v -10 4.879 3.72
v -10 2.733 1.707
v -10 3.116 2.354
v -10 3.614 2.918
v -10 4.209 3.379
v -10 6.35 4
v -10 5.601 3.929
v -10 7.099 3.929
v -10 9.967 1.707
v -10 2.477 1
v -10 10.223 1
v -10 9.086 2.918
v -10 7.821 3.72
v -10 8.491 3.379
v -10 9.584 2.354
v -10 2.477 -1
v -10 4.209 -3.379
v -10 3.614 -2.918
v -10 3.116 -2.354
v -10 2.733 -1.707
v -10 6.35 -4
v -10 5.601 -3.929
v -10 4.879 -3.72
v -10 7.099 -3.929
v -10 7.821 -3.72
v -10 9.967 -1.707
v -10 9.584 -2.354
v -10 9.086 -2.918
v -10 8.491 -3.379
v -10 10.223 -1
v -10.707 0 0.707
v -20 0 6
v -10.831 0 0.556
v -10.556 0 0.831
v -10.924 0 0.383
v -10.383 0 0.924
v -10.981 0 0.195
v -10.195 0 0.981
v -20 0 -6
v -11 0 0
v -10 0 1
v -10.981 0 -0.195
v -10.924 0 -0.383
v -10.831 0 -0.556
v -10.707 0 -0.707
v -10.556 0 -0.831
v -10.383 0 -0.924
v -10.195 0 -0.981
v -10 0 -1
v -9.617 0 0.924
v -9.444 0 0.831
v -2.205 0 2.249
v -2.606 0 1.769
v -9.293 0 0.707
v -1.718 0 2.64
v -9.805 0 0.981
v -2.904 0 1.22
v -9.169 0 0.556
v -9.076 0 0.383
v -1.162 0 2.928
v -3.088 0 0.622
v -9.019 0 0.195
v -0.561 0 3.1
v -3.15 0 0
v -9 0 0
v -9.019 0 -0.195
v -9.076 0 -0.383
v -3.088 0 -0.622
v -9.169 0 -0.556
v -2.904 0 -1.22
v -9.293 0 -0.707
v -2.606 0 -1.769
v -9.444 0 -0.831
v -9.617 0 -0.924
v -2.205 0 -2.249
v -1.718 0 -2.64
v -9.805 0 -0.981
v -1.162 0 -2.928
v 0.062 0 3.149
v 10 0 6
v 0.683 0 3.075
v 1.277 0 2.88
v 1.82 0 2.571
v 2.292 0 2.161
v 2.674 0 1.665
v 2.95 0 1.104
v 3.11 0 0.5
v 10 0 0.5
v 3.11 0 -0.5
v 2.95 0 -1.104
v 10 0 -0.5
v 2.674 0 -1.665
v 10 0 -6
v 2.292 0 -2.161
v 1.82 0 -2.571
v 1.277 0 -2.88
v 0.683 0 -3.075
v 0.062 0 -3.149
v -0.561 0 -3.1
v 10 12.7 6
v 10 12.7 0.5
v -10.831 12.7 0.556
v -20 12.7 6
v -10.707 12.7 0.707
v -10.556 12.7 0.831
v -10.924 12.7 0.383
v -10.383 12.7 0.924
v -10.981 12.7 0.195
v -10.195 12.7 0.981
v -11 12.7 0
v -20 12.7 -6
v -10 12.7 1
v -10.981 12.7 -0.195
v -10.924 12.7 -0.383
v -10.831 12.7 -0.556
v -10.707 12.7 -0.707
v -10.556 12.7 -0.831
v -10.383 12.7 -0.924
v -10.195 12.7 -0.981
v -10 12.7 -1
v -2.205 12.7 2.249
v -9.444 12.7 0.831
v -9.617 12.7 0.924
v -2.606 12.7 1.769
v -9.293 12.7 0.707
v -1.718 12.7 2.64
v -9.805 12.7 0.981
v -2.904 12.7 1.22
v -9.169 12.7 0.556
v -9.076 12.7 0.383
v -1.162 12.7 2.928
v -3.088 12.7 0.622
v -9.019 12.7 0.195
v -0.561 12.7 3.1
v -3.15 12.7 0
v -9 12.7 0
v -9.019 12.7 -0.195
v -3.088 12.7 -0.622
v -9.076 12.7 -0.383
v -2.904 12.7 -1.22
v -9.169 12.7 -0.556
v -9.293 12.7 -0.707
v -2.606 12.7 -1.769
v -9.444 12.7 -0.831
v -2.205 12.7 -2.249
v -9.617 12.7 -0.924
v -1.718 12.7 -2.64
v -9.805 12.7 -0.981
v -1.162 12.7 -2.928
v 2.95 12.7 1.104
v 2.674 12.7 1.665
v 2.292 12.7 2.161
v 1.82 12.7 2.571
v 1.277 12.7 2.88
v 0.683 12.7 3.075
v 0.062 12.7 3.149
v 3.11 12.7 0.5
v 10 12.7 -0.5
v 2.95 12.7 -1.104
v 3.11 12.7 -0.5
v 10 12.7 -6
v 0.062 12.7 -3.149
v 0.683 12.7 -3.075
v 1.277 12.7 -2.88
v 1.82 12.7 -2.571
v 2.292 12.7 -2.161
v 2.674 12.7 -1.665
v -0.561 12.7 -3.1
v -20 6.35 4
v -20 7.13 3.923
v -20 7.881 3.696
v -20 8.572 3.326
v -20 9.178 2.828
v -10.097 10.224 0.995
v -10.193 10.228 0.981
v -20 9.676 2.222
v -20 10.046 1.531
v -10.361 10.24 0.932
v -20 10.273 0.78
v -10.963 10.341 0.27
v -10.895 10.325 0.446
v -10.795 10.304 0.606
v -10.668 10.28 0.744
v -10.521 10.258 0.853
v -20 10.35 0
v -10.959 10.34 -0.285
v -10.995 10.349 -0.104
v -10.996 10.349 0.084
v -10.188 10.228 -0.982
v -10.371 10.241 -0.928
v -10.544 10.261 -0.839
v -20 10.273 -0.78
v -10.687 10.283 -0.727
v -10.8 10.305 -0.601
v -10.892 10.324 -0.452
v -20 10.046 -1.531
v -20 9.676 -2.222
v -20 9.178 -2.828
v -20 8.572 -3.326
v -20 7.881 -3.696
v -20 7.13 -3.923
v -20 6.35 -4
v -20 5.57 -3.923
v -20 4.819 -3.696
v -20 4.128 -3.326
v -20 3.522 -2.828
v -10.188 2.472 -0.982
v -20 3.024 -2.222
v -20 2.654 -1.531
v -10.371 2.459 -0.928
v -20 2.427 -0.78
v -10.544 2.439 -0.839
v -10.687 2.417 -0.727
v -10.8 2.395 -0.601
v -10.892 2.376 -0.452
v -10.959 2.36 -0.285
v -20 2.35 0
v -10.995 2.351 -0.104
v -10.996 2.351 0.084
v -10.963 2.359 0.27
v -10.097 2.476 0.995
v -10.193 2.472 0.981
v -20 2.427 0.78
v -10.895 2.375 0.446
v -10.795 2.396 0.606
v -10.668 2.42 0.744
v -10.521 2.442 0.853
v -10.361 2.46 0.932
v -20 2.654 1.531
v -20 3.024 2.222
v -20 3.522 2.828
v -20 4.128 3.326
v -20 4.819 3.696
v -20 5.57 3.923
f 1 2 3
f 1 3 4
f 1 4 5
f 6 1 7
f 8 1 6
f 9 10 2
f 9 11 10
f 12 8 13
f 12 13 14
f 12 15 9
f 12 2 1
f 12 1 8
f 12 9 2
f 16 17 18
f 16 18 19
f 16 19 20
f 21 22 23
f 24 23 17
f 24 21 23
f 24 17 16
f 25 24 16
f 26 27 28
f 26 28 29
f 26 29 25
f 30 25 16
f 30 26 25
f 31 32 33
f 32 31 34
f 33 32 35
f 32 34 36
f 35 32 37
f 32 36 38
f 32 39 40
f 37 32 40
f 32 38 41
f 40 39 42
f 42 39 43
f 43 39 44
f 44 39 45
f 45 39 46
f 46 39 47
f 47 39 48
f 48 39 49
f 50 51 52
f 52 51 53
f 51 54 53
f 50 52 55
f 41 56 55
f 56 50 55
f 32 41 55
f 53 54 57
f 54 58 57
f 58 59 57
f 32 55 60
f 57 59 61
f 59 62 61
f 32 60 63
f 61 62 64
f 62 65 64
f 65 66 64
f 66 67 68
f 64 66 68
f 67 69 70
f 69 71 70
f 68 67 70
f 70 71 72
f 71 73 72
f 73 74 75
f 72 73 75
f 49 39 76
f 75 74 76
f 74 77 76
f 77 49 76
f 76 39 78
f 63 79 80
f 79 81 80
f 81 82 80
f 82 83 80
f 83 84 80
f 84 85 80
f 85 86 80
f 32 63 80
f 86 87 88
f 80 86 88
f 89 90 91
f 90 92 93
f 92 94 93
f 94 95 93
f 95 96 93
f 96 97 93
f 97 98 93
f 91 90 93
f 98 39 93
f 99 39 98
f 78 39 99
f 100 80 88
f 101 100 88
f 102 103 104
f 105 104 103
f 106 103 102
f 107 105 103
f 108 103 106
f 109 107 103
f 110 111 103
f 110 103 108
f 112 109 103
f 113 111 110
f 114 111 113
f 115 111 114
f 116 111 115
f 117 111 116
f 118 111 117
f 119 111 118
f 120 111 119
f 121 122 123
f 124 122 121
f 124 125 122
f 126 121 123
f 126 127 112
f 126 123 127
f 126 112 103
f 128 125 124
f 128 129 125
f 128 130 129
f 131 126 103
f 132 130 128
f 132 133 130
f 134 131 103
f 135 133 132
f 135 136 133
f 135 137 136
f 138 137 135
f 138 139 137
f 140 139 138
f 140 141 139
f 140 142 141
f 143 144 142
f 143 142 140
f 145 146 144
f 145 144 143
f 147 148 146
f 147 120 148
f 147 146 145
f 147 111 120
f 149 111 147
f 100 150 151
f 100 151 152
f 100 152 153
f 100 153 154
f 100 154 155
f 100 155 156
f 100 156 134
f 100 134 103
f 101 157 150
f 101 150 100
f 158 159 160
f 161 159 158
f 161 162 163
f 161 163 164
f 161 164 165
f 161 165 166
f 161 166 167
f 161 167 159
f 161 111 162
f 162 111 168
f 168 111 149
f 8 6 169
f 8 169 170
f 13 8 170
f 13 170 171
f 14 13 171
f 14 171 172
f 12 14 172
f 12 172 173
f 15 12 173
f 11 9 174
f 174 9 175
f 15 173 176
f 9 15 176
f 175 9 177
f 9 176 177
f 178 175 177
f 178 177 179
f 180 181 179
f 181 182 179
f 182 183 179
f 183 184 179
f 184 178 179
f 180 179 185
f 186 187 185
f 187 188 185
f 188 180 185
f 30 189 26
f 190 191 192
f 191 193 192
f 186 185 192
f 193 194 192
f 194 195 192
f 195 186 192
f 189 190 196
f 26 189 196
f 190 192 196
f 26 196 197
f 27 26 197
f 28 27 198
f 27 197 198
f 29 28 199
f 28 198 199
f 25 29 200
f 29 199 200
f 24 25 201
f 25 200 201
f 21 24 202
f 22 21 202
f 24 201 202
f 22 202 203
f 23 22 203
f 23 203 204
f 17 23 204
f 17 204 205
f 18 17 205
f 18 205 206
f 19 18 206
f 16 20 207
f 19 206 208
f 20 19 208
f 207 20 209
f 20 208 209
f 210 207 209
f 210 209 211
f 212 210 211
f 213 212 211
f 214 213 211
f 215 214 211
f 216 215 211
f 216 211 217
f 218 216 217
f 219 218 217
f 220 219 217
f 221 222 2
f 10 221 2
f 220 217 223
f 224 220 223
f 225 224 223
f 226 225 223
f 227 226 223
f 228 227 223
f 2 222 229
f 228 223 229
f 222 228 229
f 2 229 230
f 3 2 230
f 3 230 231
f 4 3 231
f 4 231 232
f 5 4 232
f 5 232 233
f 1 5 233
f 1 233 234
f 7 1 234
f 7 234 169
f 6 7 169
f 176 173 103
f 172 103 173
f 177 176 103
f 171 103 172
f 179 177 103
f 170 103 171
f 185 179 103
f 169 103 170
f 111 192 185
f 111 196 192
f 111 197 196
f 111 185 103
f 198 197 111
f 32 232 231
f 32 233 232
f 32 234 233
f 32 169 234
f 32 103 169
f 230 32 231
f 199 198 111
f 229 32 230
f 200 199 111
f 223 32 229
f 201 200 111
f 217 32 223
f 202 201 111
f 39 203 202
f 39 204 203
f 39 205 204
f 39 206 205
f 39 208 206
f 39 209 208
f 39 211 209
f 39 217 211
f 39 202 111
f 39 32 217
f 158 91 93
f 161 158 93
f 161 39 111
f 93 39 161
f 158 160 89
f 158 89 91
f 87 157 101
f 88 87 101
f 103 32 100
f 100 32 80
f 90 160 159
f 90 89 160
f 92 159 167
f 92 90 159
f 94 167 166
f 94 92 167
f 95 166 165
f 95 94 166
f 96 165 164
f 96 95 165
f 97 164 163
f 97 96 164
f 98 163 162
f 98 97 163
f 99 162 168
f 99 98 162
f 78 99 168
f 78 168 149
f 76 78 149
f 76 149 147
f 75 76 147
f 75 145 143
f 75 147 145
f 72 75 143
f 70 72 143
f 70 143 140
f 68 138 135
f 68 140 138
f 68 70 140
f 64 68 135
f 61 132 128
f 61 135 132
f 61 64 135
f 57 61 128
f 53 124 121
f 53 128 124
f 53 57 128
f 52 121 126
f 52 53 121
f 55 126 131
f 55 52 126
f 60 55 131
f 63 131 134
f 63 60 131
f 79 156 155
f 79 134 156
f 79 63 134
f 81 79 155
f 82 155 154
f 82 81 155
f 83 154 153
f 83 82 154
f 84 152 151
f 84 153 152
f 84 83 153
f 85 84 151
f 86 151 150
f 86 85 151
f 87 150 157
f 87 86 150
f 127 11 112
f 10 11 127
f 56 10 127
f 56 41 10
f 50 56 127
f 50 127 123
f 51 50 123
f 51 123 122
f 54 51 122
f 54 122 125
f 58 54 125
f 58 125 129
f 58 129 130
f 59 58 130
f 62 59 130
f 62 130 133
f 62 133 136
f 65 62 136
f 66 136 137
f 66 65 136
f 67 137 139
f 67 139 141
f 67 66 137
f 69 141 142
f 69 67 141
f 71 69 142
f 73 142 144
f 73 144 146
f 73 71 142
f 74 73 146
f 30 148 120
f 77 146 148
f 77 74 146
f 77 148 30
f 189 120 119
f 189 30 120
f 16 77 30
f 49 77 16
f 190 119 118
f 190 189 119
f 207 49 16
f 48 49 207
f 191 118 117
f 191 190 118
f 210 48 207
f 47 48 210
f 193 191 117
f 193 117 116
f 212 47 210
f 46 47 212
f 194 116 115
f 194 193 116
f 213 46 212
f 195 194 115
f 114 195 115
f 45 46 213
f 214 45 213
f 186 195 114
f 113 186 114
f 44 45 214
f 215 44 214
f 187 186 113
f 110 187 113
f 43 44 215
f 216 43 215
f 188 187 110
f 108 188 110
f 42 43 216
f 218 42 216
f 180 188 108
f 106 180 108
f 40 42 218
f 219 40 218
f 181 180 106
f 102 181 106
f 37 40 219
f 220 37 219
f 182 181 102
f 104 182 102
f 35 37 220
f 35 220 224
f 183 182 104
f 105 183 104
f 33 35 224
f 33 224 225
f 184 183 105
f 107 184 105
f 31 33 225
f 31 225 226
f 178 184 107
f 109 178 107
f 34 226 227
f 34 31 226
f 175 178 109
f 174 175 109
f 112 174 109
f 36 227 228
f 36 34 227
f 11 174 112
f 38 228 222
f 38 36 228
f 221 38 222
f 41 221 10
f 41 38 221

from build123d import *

# Parameters (mm, degrees)
SKETCH1_W           = 30
SKETCH1_H           = 12
SKETCH1_R           = 3.15
SKETCH1_R_2         = 1
BOSS_EXTRUDE1_DEPTH = 12.7
SKETCH2_R           = 4
CUT_EXTRUDE1_DEPTH  = 10
SKETCH3_W           = 6.889935692
SKETCH3_H           = 1
CUT_EXTRUDE2_DEPTH  = 25.439517314


with BuildPart() as part:
    # Sketch1 → Boss-Extrude1 (new body)
    with BuildSketch(Plane(origin=(0, 0, 0), x_dir=(1, 0, 0), z_dir=(0, 1, 0))):
        with Locations((-5, 0)):
            Rectangle(SKETCH1_W, SKETCH1_H)
        with Locations(Location((0, 0, 0), (0, 0, 270))):
            Circle(SKETCH1_R, mode=Mode.SUBTRACT)
        with Locations(Location((-10, 0, 0), (0, 0, 270))):
            Circle(SKETCH1_R_2, mode=Mode.SUBTRACT)
    extrude(amount=BOSS_EXTRUDE1_DEPTH)

    # Sketch2 → Cut-Extrude1 (cut)
    with BuildSketch(Plane.ZY.offset(20)):
        with Locations((0, 6.35)):
            Circle(SKETCH2_R)
    extrude(amount=-CUT_EXTRUDE1_DEPTH, mode=Mode.SUBTRACT)

    # Sketch3 → Cut-Extrude2 (cut, through all)
    with BuildSketch(Plane(origin=(0, 12.7, 0), x_dir=(1, 0, 0), z_dir=(0, 1, 0))):
        with Locations((6.555032154, 0)):
            Rectangle(SKETCH3_W, SKETCH3_H)
    extrude(amount=-CUT_EXTRUDE2_DEPTH, mode=Mode.SUBTRACT)


solid = part.part
